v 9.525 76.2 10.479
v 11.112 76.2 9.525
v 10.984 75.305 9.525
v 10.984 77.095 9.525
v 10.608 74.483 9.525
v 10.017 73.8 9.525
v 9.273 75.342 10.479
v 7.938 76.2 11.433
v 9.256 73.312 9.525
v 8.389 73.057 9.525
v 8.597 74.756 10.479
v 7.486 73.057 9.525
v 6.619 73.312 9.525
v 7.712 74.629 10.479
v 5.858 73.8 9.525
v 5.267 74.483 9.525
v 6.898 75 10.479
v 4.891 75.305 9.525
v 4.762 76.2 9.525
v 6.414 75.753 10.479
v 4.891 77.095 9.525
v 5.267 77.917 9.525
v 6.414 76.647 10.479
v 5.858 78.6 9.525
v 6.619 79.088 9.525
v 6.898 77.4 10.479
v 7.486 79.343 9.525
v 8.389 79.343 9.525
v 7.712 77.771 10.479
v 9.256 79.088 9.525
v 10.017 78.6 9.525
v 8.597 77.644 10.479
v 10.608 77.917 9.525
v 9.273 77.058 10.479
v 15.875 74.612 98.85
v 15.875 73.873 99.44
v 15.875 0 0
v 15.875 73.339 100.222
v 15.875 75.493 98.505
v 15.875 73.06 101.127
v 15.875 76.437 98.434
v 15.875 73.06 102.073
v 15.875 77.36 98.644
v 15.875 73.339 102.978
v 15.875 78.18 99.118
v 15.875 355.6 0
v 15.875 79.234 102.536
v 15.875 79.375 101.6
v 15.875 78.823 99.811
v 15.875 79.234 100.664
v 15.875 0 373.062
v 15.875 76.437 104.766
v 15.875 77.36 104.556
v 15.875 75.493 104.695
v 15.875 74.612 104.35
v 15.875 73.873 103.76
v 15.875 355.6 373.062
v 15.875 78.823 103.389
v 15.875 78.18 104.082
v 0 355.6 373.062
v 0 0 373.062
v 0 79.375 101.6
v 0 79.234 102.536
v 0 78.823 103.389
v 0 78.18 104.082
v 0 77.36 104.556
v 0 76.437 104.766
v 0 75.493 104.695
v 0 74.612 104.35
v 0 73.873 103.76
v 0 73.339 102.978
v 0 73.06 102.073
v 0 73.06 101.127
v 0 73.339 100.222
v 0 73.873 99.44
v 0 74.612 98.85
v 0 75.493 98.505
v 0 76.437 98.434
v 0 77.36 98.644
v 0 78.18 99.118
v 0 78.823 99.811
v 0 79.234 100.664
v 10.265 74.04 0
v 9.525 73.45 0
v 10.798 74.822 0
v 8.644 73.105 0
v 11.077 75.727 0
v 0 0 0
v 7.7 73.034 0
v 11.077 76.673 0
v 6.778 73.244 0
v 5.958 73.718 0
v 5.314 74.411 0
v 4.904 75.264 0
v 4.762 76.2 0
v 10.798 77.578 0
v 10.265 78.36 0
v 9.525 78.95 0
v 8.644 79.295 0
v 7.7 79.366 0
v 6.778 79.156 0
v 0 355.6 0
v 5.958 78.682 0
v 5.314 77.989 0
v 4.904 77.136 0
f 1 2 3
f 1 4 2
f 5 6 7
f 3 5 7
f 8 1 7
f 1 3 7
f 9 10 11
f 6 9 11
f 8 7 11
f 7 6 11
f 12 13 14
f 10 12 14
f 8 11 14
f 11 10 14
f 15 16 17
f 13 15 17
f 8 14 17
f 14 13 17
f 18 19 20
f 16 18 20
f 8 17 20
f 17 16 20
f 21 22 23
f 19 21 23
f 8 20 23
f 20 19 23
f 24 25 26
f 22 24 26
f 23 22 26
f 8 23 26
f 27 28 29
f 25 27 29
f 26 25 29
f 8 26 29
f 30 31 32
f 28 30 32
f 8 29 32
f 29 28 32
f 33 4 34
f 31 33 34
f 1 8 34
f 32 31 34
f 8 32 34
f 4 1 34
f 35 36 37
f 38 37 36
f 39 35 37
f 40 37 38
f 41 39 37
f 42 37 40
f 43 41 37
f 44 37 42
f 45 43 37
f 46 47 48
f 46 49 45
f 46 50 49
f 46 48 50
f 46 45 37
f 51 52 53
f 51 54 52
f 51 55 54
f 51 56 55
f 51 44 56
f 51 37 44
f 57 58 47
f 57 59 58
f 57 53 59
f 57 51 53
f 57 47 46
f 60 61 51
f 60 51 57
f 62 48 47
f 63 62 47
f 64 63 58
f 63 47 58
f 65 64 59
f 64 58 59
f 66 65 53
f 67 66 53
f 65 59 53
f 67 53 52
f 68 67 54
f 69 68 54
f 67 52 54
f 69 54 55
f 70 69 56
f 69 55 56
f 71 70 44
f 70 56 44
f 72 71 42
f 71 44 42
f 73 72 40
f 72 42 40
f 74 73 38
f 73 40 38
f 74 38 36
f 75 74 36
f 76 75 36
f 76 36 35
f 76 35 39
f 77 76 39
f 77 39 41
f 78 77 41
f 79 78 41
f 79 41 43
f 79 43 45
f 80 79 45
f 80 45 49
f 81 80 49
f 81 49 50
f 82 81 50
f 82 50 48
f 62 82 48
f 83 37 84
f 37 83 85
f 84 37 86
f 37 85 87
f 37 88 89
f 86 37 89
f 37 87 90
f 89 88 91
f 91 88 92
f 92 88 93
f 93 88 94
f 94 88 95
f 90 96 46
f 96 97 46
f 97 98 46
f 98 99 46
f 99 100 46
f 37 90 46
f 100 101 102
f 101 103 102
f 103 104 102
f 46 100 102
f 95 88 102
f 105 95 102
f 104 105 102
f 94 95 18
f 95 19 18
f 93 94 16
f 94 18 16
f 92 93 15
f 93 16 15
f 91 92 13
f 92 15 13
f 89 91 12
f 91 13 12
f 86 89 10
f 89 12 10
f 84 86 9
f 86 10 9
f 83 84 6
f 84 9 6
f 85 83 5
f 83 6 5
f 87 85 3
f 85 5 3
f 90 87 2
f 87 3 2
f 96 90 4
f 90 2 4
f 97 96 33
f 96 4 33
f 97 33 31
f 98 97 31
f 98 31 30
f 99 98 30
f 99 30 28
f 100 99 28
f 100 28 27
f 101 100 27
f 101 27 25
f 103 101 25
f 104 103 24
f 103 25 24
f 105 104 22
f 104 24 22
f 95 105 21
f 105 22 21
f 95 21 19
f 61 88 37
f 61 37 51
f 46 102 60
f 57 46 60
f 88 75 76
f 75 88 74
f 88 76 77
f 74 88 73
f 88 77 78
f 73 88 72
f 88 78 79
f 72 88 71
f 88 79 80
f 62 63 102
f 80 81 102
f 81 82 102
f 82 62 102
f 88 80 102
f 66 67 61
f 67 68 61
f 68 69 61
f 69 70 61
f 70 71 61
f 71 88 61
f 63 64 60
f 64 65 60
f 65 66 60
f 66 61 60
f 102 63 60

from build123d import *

# Parameters (mm, degrees)
F0_W     = 355.6
F0_H     = 373.0625
F1_DEPTH = 15.875
F3_D     = 6.35
F3_DEPTH = 9.525
F3_TIP   = 1.9077324654
F5_D     = 6.35


with BuildPart() as f1:
    # F0 (on Right) → F1 (new body)
    with BuildSketch(Plane.YZ):
        with Locations((177.8, 186.53125)):
            Rectangle(F0_W, F0_H)
    extrude(amount=F1_DEPTH)

    # F3
    with Locations(Plane(origin=(0, 0, 0), x_dir=(1, 0, 0), z_dir=(0, 0, -1))):
        with Locations((7.9375, -76.2)):
            Hole(F3_D / 2, depth=F3_DEPTH)
            with Locations((0, 0, -(F3_DEPTH + F3_TIP / 2))):  # 118° drill point
                Cone(0, F3_D / 2, F3_TIP, mode=Mode.SUBTRACT)

    # F5 (through all)
    with Locations(Plane(origin=(0, 0, 0), x_dir=(0, -1, 0), z_dir=(-1, 0, 0))):
        with Locations((-76.2, 101.6)):
            Hole(F5_D / 2)


solid = f1.part
